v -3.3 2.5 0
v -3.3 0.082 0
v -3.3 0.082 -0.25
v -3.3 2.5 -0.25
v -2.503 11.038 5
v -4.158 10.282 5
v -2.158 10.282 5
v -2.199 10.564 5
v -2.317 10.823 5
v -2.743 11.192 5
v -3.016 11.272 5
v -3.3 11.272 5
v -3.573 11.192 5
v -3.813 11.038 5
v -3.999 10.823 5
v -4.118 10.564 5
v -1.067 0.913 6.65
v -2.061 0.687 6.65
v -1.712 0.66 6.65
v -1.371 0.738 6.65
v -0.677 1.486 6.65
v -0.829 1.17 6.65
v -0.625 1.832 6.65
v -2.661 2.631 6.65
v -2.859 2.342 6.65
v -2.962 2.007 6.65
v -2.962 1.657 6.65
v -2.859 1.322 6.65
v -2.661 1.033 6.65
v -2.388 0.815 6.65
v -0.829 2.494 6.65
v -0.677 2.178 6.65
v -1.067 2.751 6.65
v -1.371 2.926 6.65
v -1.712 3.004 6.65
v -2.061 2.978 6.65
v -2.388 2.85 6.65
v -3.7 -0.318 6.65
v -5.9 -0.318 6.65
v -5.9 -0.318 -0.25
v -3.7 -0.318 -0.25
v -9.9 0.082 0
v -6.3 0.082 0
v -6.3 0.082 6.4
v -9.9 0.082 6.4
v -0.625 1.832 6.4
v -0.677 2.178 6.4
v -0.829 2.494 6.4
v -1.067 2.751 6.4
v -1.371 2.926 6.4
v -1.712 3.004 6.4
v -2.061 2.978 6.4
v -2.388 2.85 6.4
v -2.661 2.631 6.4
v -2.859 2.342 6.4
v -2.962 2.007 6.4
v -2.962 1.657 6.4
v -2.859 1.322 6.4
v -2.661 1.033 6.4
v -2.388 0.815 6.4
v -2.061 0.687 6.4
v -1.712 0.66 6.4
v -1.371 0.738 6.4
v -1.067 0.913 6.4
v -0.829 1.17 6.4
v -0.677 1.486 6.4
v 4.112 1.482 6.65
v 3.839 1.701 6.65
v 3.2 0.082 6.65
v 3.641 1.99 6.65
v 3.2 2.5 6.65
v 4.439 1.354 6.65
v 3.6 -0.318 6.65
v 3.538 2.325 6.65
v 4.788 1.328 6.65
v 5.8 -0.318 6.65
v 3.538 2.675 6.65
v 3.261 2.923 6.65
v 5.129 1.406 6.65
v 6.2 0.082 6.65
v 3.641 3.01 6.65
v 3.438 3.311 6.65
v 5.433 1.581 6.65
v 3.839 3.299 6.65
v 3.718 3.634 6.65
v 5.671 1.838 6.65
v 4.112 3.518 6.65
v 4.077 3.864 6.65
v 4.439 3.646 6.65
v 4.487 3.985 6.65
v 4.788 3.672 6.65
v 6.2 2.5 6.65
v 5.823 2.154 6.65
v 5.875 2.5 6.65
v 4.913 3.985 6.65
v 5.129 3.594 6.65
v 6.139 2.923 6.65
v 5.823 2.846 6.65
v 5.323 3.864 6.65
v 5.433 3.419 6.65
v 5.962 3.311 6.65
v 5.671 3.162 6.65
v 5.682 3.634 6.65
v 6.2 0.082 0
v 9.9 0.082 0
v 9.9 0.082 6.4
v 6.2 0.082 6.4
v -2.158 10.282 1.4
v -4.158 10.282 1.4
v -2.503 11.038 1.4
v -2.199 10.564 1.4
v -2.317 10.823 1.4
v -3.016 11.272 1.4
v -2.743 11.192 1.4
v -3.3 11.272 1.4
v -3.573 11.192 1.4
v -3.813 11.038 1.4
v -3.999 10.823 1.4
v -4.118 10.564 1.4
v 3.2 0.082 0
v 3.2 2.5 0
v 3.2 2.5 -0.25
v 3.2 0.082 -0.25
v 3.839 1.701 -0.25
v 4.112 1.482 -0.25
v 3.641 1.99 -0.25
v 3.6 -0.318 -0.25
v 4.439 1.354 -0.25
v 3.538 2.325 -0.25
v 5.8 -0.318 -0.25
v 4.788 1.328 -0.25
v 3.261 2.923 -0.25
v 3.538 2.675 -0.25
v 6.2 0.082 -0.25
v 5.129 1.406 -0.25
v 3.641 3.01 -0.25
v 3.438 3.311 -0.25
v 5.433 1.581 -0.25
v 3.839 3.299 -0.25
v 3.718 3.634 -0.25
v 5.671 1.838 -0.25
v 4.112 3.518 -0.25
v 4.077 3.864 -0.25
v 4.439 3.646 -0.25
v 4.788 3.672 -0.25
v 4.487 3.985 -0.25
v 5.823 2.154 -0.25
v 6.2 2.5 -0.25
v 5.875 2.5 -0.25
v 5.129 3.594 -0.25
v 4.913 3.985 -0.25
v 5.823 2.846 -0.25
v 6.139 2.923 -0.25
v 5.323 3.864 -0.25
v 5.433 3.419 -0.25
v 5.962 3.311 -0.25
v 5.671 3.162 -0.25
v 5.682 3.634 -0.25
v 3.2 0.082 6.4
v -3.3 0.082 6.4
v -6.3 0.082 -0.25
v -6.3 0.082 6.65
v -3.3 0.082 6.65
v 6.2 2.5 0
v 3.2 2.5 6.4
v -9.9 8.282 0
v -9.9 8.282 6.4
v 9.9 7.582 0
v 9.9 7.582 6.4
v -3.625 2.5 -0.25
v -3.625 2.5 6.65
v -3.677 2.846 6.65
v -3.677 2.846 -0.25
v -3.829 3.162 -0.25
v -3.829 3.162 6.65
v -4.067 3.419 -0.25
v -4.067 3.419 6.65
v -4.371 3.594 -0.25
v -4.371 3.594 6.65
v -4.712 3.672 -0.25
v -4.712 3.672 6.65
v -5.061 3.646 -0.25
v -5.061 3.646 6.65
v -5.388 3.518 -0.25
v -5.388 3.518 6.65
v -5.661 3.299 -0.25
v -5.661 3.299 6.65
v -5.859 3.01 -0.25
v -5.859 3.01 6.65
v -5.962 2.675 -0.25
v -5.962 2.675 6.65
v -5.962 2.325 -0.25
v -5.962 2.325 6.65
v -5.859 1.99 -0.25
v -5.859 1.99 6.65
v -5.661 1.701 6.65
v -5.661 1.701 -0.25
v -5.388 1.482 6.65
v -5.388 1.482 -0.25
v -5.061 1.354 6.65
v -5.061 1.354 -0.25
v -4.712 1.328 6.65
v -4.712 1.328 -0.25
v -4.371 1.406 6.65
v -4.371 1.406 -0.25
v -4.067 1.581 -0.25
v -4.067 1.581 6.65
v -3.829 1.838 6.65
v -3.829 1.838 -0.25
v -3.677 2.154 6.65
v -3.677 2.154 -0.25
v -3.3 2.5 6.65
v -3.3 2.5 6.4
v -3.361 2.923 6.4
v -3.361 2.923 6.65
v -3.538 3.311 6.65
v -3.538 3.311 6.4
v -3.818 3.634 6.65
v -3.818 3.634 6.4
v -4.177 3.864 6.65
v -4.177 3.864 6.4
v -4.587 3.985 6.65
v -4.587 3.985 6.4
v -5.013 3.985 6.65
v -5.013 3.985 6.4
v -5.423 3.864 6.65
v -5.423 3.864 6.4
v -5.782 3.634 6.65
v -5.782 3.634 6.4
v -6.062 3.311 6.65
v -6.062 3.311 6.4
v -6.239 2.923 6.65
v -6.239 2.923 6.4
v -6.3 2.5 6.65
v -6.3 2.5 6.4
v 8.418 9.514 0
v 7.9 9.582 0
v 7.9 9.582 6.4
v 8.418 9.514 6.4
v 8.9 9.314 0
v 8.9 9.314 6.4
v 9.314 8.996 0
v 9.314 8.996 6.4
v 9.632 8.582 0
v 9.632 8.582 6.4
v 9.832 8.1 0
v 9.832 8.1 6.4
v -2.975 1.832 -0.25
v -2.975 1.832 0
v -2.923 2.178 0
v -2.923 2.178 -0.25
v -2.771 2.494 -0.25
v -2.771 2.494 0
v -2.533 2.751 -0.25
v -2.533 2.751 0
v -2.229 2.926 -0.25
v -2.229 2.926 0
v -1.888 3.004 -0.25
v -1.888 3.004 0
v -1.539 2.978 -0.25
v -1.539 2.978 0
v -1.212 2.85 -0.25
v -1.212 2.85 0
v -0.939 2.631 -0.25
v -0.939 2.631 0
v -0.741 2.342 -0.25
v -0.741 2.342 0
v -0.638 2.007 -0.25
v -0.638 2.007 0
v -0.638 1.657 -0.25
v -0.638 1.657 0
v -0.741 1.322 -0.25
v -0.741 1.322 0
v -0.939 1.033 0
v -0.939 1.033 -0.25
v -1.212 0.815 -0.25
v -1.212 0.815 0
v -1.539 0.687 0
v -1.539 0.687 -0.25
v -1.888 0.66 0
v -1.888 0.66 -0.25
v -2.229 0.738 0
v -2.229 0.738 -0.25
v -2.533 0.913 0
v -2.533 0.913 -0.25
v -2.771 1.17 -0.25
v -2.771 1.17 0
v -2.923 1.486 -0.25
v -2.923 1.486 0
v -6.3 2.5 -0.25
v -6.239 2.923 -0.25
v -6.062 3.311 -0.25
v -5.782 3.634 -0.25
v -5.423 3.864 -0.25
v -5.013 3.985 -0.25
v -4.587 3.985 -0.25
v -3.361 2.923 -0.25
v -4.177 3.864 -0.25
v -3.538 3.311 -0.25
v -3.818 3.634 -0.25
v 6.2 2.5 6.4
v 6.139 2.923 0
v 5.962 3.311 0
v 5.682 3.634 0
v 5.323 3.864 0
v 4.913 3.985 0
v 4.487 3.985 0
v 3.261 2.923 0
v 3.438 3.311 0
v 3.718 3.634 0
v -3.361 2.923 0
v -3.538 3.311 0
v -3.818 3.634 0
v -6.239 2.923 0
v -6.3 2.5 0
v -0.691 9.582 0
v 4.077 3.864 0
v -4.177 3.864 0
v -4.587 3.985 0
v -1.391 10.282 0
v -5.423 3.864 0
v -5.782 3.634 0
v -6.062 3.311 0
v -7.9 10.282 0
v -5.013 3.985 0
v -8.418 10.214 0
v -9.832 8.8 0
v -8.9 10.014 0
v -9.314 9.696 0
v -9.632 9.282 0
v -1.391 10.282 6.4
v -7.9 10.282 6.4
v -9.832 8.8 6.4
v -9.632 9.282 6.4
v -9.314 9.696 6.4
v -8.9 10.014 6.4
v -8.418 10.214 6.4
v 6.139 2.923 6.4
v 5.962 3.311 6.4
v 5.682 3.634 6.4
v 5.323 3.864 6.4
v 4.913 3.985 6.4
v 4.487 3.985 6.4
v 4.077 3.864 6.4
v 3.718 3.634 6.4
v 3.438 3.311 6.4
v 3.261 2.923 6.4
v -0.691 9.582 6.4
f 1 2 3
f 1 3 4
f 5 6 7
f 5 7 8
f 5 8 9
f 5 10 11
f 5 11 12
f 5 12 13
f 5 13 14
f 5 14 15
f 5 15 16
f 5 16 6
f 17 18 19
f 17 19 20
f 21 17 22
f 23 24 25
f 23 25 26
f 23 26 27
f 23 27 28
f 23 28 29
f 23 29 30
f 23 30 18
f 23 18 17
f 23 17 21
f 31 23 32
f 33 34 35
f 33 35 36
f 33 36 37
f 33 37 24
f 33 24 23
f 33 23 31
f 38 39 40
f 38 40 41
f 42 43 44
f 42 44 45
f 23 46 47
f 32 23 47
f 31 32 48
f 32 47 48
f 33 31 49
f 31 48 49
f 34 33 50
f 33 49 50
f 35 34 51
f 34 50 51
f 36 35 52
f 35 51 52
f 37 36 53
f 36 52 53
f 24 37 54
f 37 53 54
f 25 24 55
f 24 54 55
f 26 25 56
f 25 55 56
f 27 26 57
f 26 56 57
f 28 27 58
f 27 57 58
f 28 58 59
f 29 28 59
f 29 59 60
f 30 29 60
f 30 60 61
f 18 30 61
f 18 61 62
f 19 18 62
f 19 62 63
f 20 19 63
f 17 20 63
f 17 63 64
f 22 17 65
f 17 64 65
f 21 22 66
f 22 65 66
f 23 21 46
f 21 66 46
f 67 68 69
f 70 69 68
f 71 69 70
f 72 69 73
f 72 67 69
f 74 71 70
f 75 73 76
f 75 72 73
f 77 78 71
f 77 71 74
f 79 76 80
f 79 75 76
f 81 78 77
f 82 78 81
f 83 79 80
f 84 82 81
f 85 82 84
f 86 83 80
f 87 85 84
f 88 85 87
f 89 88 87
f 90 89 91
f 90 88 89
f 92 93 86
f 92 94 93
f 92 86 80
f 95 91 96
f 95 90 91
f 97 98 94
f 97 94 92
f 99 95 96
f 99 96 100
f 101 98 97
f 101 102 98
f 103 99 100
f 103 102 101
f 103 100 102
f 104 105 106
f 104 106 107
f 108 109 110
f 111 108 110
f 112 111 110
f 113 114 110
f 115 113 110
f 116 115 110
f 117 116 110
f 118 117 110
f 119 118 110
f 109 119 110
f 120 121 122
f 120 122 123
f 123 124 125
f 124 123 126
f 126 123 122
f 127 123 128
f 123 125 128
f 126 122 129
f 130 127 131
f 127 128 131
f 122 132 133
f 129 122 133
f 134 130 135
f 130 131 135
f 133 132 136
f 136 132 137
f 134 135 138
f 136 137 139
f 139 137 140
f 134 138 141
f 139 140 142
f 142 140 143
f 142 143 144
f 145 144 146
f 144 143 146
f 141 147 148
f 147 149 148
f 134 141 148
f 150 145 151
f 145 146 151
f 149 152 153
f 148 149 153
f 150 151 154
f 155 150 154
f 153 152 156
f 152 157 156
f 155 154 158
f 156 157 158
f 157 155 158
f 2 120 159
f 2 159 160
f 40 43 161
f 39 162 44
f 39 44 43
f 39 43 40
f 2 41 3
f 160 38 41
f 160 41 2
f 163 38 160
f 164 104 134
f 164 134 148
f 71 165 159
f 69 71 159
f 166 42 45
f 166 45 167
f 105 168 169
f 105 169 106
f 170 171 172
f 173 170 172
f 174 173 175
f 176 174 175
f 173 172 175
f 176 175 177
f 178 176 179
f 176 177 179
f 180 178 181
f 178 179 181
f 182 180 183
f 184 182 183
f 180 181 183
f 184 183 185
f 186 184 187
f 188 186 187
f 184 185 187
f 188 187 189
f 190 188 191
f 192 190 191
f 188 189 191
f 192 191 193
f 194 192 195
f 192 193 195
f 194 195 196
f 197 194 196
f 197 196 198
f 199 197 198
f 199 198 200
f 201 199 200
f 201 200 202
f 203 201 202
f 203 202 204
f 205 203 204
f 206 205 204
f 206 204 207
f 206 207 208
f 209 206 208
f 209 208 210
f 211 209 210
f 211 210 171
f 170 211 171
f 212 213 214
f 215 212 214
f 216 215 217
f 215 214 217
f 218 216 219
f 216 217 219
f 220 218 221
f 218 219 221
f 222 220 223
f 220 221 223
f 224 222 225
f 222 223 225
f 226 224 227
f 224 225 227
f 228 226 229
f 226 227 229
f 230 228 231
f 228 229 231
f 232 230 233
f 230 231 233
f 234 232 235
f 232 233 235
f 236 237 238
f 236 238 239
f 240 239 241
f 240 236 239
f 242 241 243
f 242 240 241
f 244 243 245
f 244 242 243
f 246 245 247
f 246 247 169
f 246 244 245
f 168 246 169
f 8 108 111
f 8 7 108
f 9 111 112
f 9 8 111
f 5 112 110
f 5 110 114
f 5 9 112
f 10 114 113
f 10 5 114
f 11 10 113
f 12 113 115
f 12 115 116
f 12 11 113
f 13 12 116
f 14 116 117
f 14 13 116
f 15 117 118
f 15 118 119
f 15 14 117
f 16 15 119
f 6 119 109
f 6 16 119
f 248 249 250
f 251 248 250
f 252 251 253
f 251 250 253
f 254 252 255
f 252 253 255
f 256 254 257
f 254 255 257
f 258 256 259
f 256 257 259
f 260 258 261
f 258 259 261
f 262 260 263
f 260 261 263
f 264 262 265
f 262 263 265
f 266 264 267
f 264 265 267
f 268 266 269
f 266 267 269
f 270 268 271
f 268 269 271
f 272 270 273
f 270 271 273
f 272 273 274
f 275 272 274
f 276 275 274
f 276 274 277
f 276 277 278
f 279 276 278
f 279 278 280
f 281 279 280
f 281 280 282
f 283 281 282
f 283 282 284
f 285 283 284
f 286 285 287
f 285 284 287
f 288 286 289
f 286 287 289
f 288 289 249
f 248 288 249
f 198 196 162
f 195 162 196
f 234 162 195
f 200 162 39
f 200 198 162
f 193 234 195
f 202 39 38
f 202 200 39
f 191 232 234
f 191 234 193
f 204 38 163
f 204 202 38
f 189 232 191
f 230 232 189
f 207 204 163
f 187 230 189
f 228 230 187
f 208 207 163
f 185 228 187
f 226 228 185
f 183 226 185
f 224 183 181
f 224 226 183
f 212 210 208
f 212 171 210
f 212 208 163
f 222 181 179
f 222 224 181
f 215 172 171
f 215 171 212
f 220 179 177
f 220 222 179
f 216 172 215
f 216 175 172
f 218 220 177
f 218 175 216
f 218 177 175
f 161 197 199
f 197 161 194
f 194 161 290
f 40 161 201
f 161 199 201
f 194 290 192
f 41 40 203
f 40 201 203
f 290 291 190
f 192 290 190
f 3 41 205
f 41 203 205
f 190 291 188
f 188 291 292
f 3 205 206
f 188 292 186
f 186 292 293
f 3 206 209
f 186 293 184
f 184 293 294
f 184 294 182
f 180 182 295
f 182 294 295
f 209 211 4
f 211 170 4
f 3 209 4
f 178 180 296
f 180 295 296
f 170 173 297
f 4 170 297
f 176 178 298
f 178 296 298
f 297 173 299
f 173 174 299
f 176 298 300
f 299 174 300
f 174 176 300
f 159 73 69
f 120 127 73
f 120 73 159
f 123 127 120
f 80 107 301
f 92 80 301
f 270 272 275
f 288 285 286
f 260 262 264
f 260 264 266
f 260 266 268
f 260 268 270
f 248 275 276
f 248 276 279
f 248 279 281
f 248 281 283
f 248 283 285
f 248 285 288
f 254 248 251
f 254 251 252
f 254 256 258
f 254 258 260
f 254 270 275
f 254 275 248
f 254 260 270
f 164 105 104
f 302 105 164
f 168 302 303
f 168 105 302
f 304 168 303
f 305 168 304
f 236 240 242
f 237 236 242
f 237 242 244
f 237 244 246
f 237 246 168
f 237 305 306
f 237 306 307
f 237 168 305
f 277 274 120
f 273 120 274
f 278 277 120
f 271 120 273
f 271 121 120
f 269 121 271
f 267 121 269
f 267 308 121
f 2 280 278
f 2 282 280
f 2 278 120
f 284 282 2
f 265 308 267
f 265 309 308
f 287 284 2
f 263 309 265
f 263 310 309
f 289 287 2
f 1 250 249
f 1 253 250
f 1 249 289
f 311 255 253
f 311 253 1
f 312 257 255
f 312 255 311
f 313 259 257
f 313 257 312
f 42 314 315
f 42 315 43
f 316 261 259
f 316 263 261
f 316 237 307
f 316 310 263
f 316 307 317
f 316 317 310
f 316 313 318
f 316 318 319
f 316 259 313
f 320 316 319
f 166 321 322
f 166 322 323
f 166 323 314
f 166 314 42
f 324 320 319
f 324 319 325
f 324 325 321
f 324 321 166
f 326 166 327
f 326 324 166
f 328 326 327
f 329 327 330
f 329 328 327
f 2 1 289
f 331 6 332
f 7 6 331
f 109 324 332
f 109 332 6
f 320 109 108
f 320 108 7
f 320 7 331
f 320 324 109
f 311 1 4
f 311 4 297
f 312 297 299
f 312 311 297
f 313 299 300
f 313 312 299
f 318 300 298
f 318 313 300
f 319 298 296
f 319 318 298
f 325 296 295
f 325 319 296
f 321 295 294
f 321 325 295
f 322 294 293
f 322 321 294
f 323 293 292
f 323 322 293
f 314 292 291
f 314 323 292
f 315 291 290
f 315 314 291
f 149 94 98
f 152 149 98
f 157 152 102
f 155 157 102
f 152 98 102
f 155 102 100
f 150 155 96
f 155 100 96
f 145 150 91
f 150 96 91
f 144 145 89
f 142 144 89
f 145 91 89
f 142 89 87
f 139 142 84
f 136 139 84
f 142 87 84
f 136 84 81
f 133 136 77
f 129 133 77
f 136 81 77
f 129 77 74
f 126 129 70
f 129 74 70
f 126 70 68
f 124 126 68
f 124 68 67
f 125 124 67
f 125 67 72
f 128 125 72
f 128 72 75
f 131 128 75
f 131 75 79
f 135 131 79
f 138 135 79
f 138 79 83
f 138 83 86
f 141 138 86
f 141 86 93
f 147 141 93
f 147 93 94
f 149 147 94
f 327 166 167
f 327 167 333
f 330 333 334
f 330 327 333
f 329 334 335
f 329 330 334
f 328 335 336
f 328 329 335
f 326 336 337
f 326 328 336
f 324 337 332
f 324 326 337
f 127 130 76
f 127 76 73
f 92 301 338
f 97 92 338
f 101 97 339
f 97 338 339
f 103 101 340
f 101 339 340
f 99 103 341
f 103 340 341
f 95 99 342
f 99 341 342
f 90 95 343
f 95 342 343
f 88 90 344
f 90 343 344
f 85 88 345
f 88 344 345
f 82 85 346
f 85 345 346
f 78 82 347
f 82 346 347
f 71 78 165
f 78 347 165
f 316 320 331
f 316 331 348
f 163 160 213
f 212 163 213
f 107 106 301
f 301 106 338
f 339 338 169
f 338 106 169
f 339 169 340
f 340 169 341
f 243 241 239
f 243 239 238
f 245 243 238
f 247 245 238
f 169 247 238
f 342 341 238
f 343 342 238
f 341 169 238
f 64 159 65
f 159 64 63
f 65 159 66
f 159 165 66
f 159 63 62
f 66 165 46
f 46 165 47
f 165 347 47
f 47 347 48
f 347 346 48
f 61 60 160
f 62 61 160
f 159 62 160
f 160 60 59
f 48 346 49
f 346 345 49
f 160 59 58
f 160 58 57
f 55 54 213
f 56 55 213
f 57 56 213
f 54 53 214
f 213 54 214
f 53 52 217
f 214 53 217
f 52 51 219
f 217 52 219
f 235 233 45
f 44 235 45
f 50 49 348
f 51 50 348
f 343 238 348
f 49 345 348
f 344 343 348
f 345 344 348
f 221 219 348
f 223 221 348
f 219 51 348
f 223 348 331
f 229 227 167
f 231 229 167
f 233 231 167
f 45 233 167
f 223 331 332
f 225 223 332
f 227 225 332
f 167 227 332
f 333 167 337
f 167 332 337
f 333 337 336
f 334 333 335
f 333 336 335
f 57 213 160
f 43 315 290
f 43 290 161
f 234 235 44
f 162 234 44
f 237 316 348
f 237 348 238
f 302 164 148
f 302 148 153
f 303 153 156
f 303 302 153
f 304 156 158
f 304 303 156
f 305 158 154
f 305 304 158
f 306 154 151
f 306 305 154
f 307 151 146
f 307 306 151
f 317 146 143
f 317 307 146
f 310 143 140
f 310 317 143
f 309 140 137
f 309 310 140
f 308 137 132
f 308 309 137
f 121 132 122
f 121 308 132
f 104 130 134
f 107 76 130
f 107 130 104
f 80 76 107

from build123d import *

# Parameters (mm, degrees)
BOSS_EXTRUDE1_DEPTH      = 6.4
SKETCH4_R                = 1.175
BOSS_EXTRUDE2_DEPTH      = 0.25
SKETCH5_R                = 1.175
BOSS_EXTRUDE3_DEPTH      = 0.25
SKETCH6_R                = 1.175
CUT_EXTRUDE1_DEPTH       = 7.9
BOSS_EXTRUDE4_DEPTH      = 1.8
BOSS_EXTRUDE4_DEPTH_BACK = 1.8


with BuildPart() as part:
    # Sketch2 → Boss-Extrude1 (new body)
    with BuildSketch(Plane.XY):
        with BuildLine():
            Line((-7.9, 10.282147184), (-1.391176502, 10.282147184))
            Line((-1.391176502, 10.282147184), (-0.691176502, 9.582147184))
            Line((-0.691176502, 9.582147184), (7.9, 9.582147184))
            ThreePointArc((7.9, 9.582147184), (9.314213562, 8.996360746), (9.9, 7.582147184))
            Line((9.9, 7.582147184), (9.9, 0.082147184))
            Line((9.9, 0.082147184), (6.2, 0.082147184))
            Line((6.2, 0.082147184), (5.8, -0.317852816))
            Line((5.8, -0.317852816), (3.6, -0.317852816))
            Line((3.6, -0.317852816), (3.2, 0.082147184))
            Line((3.2, 0.082147184), (-3.3, 0.082147184))
            Line((-3.3, 0.082147184), (-3.7, -0.317852816))
            Line((-3.7, -0.317852816), (-5.9, -0.317852816))
            Line((-5.9, -0.317852816), (-6.3, 0.082147184))
            Line((-6.3, 0.082147184), (-9.9, 0.082147184))
            Line((-9.9, 0.082147184), (-9.9, 8.282147184))
            ThreePointArc((-9.9, 8.282147184), (-9.314213562, 9.696360746), (-7.9, 10.282147184))
        make_face()
    extrude(amount=BOSS_EXTRUDE1_DEPTH)

    # Sketch4 → Boss-Extrude2 (add)
    with BuildSketch(Plane.XY.offset(6.4)):
        with Locations((-1.8, 1.832147184)):
            Circle(SKETCH4_R)
        with BuildLine():
            Line((-6.3, 2.5), (-6.3, 0.082147184))
            Line((-6.3, 0.082147184), (-5.9, -0.317852816))
            Line((-5.9, -0.317852816), (-3.7, -0.317852816))
            Line((-3.7, -0.317852816), (-3.3, 0.082147184))
            Line((-3.3, 0.082147184), (-3.3, 2.5))
            ThreePointArc((-3.3, 2.5), (-4.8, 4), (-6.3, 2.5))
        make_face()
        with BuildLine():
            Line((3.2, 2.5), (3.2, 0.082147184))
            Line((3.2, 0.082147184), (3.6, -0.317852816))
            Line((3.6, -0.317852816), (5.8, -0.317852816))
            Line((5.8, -0.317852816), (6.2, 0.082147184))
            Line((6.2, 0.082147184), (6.2, 2.5))
            ThreePointArc((6.2, 2.5), (4.7, 4), (3.2, 2.5))
        make_face()
    extrude(amount=BOSS_EXTRUDE2_DEPTH)

    # Sketch5 → Boss-Extrude3 (add)
    with BuildSketch(Plane(origin=(0, 0, 0), x_dir=(-1, 0, 0), z_dir=(0, 0, -1))):
        with Locations((1.8, 1.832147184)):
            Circle(SKETCH5_R)
        with BuildLine():
            Line((6.3, 2.5), (6.3, 0.082147184))
            Line((6.3, 0.082147184), (5.9, -0.317852816))
            Line((5.9, -0.317852816), (3.7, -0.317852816))
            Line((3.7, -0.317852816), (3.3, 0.082147184))
            Line((3.3, 0.082147184), (3.3, 2.5))
            ThreePointArc((3.3, 2.5), (4.8, 4), (6.3, 2.5))
        make_face()
        with BuildLine():
            Line((-3.2, 2.5), (-3.2, 0.082147184))
            Line((-3.2, 0.082147184), (-3.6, -0.317852816))
            Line((-3.6, -0.317852816), (-5.8, -0.317852816))
            Line((-5.8, -0.317852816), (-6.2, 0.082147184))
            Line((-6.2, 0.082147184), (-6.2, 2.5))
            ThreePointArc((-6.2, 2.5), (-4.7, 4), (-3.2, 2.5))
        make_face()
    extrude(amount=BOSS_EXTRUDE3_DEPTH)

    # Sketch6 → Cut-Extrude1 (cut, through all)
    with BuildSketch(Plane.XY.offset(6.65)):
        with Locations((-4.8, 2.5)):
            Circle(SKETCH6_R)
        with Locations((4.7, 2.5)):
            Circle(SKETCH6_R)
    extrude(amount=-CUT_EXTRUDE1_DEPTH, mode=Mode.SUBTRACT)

    # Sketch7 → Boss-Extrude4 (add, two sides)
    with BuildSketch(Plane.XY.offset(3.2)) as boss_extrude4_sk:
        with BuildLine():
            Line((-4.158024121, 10.282147184), (-2.158024121, 10.282147184))
            ThreePointArc((-2.158024121, 10.282147184), (-3.158024121, 11.282147184), (-4.158024121, 10.282147184))
        make_face()
    extrude(amount=BOSS_EXTRUDE4_DEPTH)
    extrude(boss_extrude4_sk.sketch, amount=-BOSS_EXTRUDE4_DEPTH_BACK)


solid = part.part
